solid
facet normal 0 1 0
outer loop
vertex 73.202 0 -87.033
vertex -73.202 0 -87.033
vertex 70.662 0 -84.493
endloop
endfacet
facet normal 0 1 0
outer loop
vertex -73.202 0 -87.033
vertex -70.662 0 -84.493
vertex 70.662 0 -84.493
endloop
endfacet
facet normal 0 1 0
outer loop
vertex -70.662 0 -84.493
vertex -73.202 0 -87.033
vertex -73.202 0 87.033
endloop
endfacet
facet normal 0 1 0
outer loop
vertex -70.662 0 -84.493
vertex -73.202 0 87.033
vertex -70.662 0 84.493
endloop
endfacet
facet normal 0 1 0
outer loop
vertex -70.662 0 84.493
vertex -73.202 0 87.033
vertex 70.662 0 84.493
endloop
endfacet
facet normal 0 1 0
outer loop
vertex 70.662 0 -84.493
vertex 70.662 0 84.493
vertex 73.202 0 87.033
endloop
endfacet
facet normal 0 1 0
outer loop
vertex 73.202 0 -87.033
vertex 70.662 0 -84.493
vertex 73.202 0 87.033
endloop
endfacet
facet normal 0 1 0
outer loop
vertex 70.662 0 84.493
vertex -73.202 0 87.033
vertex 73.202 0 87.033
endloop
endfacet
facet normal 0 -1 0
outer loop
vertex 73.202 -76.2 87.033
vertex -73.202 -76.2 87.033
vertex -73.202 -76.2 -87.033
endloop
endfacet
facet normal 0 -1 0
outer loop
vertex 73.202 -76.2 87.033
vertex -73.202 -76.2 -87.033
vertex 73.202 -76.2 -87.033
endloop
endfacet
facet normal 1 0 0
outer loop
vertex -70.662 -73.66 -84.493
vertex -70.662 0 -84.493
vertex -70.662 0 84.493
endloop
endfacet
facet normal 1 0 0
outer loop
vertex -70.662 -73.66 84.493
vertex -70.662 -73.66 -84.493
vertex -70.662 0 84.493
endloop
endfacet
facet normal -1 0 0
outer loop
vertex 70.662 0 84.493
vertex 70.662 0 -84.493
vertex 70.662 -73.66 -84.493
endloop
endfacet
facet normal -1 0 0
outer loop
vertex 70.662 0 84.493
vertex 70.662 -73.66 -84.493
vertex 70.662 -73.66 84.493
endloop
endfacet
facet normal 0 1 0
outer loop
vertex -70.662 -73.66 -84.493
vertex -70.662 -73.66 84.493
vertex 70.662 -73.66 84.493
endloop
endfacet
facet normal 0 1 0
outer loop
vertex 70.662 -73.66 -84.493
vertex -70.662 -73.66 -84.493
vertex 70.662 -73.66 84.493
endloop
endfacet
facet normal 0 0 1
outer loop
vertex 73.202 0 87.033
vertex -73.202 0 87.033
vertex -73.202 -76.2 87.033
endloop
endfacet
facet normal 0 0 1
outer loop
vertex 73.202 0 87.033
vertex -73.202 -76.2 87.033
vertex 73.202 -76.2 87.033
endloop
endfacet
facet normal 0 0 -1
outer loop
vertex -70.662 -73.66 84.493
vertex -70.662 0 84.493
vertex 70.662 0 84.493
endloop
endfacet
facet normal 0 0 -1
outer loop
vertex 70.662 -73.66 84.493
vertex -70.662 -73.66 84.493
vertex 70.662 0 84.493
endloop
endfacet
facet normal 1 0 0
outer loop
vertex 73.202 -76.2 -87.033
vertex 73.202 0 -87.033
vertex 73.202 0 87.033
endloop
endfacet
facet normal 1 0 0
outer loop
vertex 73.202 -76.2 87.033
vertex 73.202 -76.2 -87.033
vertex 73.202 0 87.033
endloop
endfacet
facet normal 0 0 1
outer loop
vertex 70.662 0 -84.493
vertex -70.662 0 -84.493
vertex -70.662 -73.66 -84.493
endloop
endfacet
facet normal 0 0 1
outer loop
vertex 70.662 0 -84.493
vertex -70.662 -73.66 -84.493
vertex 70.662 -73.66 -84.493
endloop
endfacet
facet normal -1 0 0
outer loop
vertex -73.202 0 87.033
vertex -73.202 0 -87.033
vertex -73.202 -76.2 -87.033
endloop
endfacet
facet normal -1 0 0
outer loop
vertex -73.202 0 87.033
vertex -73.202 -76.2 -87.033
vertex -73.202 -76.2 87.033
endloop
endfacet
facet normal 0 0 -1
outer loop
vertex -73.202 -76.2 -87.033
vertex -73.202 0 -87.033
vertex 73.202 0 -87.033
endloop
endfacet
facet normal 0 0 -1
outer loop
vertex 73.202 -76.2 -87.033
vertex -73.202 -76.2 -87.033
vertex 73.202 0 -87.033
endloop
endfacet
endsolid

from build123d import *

# Parameters (mm, degrees)
F0_W     = 255.4635107517
F0_H     = 167.3530042171
F1_DEPTH = 127
F3_W     = 146.4032530785
F3_H     = 174.0650087595
F4_DEPTH = 76.2
F5_T     = -2.54


with BuildPart() as f1:
    # F0 (on Front) → F1 (new body)
    with BuildSketch(Plane.XZ):
        Rectangle(F0_W, F0_H)
    extrude(amount=F1_DEPTH)


with BuildPart() as f4:
    # F3 (on Front) → F4 (new body)
    with BuildSketch(Plane.XZ):
        Rectangle(F3_W, F3_H)
    extrude(amount=F4_DEPTH)

    # F5
    f5_openings = [f4.faces().sort_by_distance(p)[0] for p in [
        (0, 0, 0),
    ]]
    offset(amount=F5_T, openings=f5_openings)


solid = f4.part
